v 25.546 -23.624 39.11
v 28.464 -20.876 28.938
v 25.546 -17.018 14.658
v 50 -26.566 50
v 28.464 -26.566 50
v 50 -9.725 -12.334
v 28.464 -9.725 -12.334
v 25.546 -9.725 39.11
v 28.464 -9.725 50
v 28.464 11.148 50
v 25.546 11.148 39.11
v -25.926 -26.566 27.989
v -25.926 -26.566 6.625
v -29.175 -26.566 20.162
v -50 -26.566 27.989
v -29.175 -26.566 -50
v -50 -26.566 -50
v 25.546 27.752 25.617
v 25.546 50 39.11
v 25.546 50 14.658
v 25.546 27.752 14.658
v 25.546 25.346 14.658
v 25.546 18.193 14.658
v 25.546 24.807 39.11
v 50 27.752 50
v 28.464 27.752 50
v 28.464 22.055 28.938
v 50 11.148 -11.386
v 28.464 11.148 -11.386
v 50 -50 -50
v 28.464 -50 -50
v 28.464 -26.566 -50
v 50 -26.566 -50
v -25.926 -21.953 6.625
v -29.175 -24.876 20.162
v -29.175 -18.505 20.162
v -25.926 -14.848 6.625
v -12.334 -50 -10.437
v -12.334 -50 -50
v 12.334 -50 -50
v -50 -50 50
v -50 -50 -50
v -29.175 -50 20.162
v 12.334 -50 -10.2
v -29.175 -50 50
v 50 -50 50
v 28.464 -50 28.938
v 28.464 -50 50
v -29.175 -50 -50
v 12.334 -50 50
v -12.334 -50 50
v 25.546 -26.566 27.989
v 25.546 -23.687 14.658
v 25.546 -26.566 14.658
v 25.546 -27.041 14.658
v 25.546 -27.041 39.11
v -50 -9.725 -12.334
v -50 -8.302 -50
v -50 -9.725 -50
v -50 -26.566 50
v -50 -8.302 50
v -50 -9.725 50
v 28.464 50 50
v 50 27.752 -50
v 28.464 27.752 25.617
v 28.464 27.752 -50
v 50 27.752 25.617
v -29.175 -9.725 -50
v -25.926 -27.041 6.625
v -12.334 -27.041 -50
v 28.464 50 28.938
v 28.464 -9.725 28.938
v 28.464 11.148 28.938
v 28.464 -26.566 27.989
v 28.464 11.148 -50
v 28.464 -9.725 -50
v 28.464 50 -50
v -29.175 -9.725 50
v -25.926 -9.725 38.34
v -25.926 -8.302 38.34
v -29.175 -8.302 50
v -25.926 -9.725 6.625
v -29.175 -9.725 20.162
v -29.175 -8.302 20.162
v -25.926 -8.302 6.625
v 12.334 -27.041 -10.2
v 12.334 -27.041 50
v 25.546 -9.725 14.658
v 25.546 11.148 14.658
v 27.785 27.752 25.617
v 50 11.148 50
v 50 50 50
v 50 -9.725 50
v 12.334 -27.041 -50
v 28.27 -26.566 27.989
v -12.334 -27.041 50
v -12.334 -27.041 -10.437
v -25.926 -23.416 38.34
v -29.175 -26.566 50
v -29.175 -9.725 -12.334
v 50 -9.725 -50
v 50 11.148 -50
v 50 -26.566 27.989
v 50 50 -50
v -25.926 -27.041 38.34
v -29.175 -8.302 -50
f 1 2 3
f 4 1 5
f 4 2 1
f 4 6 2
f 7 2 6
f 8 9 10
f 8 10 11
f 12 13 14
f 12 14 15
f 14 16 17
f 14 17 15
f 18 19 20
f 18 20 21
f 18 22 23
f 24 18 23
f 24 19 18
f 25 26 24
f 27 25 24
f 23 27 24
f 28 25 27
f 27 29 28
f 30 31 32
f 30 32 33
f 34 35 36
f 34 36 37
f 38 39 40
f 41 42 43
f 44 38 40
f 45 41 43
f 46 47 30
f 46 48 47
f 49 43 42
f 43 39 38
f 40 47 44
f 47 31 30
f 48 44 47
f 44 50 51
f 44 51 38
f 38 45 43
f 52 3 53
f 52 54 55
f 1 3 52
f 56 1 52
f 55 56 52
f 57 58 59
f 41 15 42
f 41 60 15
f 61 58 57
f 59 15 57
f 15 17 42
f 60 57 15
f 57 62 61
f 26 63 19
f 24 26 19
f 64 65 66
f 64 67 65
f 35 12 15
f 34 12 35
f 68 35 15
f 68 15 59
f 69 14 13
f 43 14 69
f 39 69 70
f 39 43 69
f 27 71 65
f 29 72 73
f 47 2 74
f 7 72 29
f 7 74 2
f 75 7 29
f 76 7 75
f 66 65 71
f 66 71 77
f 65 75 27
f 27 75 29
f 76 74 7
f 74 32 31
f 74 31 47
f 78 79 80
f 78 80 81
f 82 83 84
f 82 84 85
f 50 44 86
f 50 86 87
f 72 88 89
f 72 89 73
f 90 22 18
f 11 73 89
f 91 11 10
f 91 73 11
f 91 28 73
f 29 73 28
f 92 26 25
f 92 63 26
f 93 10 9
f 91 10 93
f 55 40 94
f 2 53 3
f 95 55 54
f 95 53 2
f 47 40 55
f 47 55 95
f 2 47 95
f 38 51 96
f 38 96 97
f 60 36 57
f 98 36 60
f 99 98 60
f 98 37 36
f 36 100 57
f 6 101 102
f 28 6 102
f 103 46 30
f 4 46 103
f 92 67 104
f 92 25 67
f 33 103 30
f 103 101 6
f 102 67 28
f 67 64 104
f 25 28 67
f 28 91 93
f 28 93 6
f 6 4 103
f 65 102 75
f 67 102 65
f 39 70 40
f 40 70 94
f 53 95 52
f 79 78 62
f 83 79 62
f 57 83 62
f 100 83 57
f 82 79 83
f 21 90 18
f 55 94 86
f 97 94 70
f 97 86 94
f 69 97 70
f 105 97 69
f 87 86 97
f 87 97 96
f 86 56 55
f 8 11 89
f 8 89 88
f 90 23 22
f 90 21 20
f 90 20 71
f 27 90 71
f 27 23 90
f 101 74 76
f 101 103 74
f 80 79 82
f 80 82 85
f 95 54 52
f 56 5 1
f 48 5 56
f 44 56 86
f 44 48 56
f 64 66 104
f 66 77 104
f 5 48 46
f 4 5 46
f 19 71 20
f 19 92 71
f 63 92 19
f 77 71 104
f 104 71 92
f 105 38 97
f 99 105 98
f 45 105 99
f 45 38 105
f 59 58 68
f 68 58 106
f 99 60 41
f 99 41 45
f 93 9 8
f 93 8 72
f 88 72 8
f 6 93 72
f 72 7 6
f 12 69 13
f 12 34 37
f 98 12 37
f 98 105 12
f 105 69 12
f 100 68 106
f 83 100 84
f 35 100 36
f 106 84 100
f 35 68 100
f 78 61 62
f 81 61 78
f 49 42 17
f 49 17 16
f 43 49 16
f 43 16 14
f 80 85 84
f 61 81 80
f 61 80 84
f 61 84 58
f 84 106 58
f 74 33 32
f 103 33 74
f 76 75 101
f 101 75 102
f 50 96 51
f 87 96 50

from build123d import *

# Parameters (mm, degrees)
F3_DEPTH = 50
F4_DEPTH = 50
F5_DEPTH = 50


with BuildPart() as f3:
    # F0 (on Top) → F3 (new body, symmetric)
    with BuildSketch(Plane.XY):
        Polygon((50, -27.040666), (50, 50), (25.545932, 50), (25.545932, -27.040666), (-25.926208, -27.040666), (-25.926208, -8.301959), (-50, -8.301959), (-50, -27.040666), (-50, -50), (-25.926208, -50), (25.545932, -50), (50, -50), align=None)
    extrude(amount=F3_DEPTH, both=True)

    # F1 (on Front) → F4 (intersect, symmetric)
    with BuildSketch(Plane.XZ):
        Polygon((-29.175453, 50), (-50, 50), (-50, -50), (-29.175453, -50), (-29.175453, 20.161899), (-12.334338, -50), (12.334337, -50), (28.463857, 28.938254), (28.463857, -50), (50, -50), (50, 50), (28.463857, 50), (12.334337, -10.199549), (12.334337, 50), (-12.334338, 50), (-12.334338, -10.436747), align=None)
    extrude(amount=F4_DEPTH, both=True, mode=Mode.INTERSECT)

    # F2 (on Right) → F5 (intersect, symmetric)
    with BuildSketch(Plane.YZ):
        Polygon((-26.566265, 50), (-50, 50), (-50, -50), (-26.566265, -50), (-26.566265, 27.98946), (-9.725152, -50), (11.148345, -50), (27.752262, 25.617471), (27.752262, -50), (50, -50), (50, 50), (27.752262, 50), (11.148345, -11.385542), (11.148345, 50), (-9.725152, 50), (-9.725152, -12.334338), align=None)
    extrude(amount=F5_DEPTH, both=True, mode=Mode.INTERSECT)


solid = f3.part
